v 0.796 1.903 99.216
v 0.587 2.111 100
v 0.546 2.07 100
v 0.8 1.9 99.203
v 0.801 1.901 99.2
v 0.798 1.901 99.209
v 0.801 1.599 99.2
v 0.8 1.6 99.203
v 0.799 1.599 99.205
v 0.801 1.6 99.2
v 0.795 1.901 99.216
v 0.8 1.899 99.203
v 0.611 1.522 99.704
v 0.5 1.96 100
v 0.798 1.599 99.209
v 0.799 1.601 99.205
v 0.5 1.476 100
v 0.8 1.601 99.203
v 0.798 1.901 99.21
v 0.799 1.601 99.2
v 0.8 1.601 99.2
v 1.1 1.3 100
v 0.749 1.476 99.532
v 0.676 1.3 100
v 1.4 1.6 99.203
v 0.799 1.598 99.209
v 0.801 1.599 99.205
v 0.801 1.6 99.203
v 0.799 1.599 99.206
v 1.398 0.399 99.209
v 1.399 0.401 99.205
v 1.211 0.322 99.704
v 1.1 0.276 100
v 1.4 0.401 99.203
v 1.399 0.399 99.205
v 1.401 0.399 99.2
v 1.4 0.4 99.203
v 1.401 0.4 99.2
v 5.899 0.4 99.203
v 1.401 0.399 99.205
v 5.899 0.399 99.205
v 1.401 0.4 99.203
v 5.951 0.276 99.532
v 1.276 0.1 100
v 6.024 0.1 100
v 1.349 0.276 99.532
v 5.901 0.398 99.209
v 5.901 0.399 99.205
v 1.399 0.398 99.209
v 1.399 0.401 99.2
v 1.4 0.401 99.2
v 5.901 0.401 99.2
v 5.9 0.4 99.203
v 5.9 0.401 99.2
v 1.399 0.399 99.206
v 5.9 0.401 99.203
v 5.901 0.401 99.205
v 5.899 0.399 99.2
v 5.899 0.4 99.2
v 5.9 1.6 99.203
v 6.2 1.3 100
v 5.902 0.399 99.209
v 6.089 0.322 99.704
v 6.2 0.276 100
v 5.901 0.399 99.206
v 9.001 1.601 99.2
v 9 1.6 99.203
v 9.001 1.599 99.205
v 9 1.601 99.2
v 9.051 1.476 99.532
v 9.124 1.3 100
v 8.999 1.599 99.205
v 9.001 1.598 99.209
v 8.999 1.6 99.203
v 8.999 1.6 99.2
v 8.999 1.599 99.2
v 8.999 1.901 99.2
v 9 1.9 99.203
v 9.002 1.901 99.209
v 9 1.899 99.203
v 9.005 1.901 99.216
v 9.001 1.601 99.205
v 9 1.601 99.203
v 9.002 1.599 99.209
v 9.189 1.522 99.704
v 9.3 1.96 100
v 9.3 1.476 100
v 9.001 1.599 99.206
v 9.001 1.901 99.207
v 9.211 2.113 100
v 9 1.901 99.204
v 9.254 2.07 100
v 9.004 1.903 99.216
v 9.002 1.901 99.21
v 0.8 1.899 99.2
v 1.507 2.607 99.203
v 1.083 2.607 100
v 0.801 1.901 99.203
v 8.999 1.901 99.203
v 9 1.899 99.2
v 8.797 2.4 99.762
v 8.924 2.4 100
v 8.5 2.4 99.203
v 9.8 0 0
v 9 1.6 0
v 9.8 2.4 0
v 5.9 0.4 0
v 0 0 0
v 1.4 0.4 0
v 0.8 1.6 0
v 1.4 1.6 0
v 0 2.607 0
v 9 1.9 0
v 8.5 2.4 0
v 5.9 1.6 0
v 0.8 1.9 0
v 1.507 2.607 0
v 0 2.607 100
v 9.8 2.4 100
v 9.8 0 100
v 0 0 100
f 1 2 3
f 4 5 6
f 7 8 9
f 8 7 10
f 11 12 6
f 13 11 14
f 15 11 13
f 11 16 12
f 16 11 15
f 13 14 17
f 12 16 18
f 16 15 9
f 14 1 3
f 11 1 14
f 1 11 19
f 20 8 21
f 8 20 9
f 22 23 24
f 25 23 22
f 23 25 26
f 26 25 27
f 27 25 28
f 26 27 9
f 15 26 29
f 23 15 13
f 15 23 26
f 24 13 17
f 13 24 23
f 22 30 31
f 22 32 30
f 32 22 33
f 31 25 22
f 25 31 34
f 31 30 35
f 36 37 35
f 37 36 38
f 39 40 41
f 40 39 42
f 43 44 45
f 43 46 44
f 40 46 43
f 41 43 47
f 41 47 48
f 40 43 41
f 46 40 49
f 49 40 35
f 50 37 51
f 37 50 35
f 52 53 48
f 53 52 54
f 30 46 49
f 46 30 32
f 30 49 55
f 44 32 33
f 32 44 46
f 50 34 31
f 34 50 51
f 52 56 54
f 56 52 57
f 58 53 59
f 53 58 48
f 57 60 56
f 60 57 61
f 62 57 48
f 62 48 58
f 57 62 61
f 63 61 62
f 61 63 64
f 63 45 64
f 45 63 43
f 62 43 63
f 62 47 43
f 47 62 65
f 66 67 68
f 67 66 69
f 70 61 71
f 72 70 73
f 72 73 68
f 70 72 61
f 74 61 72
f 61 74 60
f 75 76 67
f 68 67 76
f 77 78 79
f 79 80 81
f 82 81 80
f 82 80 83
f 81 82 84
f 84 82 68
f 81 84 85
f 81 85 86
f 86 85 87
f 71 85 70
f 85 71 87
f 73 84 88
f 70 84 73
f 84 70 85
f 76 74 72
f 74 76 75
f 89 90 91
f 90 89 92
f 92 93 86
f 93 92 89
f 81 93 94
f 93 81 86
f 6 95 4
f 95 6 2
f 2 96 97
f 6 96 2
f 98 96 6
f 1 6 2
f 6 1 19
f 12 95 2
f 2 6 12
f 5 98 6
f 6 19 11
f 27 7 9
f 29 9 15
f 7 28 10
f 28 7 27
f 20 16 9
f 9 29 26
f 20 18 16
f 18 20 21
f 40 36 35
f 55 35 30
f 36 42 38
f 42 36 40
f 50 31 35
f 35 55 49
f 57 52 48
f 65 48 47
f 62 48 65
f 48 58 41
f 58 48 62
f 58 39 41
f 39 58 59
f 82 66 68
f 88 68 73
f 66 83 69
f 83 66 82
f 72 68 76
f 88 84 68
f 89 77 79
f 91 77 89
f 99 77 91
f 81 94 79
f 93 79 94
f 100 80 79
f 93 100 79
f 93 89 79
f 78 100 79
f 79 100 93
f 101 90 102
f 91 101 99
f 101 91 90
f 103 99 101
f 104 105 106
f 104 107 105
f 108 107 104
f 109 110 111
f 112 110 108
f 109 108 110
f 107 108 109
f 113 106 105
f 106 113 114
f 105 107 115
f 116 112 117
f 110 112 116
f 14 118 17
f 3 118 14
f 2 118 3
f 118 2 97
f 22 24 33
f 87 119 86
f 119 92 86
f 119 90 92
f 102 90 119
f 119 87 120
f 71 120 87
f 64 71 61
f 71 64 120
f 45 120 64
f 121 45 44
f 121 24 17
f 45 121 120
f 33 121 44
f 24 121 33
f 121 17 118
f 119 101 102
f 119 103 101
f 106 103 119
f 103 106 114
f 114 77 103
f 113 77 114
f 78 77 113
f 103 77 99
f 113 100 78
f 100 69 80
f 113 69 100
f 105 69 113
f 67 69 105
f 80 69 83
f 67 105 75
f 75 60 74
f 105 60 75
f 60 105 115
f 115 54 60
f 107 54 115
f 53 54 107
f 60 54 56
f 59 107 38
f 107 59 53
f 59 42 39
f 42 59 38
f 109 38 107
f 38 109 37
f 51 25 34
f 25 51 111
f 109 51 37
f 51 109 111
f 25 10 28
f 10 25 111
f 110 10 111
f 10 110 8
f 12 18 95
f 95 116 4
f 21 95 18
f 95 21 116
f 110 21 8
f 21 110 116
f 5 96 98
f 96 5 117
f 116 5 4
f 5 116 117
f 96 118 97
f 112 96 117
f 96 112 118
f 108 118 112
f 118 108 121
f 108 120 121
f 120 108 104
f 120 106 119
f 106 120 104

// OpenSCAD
//==============================================================================
//
//           prism-chamfer - the missing chamfer tool for OpenSCAD
//
// Author:  Heath Raftery
// Origin:  http://github.com/hraftery/prism-chamfer
// License: GPLv3, see LICENSE for terms.
//
// See the accompanying README for instructions on use.
//
//==============================================================================


include <../prism-chamfer.scad>;

difference() {
  polygon_points = [[0,0],[0,2.607],[1.507,2.607],[0.8,1.9],[0.8,1.6],[1.4,1.6],[1.4,0.4],[5.9,0.4],[5.9,1.6],[9.0,1.6],[9.0,1.9],[8.5,2.4],[9.8,2.4],[9.8,0]];
  h=100;
  linear_extrude(height=h)
    polygon(polygon_points, convexity=2);

  prism_chamfer_mask(polygon_points, 2, 10, h,
                     0.3, 0.8, "medium");
}
